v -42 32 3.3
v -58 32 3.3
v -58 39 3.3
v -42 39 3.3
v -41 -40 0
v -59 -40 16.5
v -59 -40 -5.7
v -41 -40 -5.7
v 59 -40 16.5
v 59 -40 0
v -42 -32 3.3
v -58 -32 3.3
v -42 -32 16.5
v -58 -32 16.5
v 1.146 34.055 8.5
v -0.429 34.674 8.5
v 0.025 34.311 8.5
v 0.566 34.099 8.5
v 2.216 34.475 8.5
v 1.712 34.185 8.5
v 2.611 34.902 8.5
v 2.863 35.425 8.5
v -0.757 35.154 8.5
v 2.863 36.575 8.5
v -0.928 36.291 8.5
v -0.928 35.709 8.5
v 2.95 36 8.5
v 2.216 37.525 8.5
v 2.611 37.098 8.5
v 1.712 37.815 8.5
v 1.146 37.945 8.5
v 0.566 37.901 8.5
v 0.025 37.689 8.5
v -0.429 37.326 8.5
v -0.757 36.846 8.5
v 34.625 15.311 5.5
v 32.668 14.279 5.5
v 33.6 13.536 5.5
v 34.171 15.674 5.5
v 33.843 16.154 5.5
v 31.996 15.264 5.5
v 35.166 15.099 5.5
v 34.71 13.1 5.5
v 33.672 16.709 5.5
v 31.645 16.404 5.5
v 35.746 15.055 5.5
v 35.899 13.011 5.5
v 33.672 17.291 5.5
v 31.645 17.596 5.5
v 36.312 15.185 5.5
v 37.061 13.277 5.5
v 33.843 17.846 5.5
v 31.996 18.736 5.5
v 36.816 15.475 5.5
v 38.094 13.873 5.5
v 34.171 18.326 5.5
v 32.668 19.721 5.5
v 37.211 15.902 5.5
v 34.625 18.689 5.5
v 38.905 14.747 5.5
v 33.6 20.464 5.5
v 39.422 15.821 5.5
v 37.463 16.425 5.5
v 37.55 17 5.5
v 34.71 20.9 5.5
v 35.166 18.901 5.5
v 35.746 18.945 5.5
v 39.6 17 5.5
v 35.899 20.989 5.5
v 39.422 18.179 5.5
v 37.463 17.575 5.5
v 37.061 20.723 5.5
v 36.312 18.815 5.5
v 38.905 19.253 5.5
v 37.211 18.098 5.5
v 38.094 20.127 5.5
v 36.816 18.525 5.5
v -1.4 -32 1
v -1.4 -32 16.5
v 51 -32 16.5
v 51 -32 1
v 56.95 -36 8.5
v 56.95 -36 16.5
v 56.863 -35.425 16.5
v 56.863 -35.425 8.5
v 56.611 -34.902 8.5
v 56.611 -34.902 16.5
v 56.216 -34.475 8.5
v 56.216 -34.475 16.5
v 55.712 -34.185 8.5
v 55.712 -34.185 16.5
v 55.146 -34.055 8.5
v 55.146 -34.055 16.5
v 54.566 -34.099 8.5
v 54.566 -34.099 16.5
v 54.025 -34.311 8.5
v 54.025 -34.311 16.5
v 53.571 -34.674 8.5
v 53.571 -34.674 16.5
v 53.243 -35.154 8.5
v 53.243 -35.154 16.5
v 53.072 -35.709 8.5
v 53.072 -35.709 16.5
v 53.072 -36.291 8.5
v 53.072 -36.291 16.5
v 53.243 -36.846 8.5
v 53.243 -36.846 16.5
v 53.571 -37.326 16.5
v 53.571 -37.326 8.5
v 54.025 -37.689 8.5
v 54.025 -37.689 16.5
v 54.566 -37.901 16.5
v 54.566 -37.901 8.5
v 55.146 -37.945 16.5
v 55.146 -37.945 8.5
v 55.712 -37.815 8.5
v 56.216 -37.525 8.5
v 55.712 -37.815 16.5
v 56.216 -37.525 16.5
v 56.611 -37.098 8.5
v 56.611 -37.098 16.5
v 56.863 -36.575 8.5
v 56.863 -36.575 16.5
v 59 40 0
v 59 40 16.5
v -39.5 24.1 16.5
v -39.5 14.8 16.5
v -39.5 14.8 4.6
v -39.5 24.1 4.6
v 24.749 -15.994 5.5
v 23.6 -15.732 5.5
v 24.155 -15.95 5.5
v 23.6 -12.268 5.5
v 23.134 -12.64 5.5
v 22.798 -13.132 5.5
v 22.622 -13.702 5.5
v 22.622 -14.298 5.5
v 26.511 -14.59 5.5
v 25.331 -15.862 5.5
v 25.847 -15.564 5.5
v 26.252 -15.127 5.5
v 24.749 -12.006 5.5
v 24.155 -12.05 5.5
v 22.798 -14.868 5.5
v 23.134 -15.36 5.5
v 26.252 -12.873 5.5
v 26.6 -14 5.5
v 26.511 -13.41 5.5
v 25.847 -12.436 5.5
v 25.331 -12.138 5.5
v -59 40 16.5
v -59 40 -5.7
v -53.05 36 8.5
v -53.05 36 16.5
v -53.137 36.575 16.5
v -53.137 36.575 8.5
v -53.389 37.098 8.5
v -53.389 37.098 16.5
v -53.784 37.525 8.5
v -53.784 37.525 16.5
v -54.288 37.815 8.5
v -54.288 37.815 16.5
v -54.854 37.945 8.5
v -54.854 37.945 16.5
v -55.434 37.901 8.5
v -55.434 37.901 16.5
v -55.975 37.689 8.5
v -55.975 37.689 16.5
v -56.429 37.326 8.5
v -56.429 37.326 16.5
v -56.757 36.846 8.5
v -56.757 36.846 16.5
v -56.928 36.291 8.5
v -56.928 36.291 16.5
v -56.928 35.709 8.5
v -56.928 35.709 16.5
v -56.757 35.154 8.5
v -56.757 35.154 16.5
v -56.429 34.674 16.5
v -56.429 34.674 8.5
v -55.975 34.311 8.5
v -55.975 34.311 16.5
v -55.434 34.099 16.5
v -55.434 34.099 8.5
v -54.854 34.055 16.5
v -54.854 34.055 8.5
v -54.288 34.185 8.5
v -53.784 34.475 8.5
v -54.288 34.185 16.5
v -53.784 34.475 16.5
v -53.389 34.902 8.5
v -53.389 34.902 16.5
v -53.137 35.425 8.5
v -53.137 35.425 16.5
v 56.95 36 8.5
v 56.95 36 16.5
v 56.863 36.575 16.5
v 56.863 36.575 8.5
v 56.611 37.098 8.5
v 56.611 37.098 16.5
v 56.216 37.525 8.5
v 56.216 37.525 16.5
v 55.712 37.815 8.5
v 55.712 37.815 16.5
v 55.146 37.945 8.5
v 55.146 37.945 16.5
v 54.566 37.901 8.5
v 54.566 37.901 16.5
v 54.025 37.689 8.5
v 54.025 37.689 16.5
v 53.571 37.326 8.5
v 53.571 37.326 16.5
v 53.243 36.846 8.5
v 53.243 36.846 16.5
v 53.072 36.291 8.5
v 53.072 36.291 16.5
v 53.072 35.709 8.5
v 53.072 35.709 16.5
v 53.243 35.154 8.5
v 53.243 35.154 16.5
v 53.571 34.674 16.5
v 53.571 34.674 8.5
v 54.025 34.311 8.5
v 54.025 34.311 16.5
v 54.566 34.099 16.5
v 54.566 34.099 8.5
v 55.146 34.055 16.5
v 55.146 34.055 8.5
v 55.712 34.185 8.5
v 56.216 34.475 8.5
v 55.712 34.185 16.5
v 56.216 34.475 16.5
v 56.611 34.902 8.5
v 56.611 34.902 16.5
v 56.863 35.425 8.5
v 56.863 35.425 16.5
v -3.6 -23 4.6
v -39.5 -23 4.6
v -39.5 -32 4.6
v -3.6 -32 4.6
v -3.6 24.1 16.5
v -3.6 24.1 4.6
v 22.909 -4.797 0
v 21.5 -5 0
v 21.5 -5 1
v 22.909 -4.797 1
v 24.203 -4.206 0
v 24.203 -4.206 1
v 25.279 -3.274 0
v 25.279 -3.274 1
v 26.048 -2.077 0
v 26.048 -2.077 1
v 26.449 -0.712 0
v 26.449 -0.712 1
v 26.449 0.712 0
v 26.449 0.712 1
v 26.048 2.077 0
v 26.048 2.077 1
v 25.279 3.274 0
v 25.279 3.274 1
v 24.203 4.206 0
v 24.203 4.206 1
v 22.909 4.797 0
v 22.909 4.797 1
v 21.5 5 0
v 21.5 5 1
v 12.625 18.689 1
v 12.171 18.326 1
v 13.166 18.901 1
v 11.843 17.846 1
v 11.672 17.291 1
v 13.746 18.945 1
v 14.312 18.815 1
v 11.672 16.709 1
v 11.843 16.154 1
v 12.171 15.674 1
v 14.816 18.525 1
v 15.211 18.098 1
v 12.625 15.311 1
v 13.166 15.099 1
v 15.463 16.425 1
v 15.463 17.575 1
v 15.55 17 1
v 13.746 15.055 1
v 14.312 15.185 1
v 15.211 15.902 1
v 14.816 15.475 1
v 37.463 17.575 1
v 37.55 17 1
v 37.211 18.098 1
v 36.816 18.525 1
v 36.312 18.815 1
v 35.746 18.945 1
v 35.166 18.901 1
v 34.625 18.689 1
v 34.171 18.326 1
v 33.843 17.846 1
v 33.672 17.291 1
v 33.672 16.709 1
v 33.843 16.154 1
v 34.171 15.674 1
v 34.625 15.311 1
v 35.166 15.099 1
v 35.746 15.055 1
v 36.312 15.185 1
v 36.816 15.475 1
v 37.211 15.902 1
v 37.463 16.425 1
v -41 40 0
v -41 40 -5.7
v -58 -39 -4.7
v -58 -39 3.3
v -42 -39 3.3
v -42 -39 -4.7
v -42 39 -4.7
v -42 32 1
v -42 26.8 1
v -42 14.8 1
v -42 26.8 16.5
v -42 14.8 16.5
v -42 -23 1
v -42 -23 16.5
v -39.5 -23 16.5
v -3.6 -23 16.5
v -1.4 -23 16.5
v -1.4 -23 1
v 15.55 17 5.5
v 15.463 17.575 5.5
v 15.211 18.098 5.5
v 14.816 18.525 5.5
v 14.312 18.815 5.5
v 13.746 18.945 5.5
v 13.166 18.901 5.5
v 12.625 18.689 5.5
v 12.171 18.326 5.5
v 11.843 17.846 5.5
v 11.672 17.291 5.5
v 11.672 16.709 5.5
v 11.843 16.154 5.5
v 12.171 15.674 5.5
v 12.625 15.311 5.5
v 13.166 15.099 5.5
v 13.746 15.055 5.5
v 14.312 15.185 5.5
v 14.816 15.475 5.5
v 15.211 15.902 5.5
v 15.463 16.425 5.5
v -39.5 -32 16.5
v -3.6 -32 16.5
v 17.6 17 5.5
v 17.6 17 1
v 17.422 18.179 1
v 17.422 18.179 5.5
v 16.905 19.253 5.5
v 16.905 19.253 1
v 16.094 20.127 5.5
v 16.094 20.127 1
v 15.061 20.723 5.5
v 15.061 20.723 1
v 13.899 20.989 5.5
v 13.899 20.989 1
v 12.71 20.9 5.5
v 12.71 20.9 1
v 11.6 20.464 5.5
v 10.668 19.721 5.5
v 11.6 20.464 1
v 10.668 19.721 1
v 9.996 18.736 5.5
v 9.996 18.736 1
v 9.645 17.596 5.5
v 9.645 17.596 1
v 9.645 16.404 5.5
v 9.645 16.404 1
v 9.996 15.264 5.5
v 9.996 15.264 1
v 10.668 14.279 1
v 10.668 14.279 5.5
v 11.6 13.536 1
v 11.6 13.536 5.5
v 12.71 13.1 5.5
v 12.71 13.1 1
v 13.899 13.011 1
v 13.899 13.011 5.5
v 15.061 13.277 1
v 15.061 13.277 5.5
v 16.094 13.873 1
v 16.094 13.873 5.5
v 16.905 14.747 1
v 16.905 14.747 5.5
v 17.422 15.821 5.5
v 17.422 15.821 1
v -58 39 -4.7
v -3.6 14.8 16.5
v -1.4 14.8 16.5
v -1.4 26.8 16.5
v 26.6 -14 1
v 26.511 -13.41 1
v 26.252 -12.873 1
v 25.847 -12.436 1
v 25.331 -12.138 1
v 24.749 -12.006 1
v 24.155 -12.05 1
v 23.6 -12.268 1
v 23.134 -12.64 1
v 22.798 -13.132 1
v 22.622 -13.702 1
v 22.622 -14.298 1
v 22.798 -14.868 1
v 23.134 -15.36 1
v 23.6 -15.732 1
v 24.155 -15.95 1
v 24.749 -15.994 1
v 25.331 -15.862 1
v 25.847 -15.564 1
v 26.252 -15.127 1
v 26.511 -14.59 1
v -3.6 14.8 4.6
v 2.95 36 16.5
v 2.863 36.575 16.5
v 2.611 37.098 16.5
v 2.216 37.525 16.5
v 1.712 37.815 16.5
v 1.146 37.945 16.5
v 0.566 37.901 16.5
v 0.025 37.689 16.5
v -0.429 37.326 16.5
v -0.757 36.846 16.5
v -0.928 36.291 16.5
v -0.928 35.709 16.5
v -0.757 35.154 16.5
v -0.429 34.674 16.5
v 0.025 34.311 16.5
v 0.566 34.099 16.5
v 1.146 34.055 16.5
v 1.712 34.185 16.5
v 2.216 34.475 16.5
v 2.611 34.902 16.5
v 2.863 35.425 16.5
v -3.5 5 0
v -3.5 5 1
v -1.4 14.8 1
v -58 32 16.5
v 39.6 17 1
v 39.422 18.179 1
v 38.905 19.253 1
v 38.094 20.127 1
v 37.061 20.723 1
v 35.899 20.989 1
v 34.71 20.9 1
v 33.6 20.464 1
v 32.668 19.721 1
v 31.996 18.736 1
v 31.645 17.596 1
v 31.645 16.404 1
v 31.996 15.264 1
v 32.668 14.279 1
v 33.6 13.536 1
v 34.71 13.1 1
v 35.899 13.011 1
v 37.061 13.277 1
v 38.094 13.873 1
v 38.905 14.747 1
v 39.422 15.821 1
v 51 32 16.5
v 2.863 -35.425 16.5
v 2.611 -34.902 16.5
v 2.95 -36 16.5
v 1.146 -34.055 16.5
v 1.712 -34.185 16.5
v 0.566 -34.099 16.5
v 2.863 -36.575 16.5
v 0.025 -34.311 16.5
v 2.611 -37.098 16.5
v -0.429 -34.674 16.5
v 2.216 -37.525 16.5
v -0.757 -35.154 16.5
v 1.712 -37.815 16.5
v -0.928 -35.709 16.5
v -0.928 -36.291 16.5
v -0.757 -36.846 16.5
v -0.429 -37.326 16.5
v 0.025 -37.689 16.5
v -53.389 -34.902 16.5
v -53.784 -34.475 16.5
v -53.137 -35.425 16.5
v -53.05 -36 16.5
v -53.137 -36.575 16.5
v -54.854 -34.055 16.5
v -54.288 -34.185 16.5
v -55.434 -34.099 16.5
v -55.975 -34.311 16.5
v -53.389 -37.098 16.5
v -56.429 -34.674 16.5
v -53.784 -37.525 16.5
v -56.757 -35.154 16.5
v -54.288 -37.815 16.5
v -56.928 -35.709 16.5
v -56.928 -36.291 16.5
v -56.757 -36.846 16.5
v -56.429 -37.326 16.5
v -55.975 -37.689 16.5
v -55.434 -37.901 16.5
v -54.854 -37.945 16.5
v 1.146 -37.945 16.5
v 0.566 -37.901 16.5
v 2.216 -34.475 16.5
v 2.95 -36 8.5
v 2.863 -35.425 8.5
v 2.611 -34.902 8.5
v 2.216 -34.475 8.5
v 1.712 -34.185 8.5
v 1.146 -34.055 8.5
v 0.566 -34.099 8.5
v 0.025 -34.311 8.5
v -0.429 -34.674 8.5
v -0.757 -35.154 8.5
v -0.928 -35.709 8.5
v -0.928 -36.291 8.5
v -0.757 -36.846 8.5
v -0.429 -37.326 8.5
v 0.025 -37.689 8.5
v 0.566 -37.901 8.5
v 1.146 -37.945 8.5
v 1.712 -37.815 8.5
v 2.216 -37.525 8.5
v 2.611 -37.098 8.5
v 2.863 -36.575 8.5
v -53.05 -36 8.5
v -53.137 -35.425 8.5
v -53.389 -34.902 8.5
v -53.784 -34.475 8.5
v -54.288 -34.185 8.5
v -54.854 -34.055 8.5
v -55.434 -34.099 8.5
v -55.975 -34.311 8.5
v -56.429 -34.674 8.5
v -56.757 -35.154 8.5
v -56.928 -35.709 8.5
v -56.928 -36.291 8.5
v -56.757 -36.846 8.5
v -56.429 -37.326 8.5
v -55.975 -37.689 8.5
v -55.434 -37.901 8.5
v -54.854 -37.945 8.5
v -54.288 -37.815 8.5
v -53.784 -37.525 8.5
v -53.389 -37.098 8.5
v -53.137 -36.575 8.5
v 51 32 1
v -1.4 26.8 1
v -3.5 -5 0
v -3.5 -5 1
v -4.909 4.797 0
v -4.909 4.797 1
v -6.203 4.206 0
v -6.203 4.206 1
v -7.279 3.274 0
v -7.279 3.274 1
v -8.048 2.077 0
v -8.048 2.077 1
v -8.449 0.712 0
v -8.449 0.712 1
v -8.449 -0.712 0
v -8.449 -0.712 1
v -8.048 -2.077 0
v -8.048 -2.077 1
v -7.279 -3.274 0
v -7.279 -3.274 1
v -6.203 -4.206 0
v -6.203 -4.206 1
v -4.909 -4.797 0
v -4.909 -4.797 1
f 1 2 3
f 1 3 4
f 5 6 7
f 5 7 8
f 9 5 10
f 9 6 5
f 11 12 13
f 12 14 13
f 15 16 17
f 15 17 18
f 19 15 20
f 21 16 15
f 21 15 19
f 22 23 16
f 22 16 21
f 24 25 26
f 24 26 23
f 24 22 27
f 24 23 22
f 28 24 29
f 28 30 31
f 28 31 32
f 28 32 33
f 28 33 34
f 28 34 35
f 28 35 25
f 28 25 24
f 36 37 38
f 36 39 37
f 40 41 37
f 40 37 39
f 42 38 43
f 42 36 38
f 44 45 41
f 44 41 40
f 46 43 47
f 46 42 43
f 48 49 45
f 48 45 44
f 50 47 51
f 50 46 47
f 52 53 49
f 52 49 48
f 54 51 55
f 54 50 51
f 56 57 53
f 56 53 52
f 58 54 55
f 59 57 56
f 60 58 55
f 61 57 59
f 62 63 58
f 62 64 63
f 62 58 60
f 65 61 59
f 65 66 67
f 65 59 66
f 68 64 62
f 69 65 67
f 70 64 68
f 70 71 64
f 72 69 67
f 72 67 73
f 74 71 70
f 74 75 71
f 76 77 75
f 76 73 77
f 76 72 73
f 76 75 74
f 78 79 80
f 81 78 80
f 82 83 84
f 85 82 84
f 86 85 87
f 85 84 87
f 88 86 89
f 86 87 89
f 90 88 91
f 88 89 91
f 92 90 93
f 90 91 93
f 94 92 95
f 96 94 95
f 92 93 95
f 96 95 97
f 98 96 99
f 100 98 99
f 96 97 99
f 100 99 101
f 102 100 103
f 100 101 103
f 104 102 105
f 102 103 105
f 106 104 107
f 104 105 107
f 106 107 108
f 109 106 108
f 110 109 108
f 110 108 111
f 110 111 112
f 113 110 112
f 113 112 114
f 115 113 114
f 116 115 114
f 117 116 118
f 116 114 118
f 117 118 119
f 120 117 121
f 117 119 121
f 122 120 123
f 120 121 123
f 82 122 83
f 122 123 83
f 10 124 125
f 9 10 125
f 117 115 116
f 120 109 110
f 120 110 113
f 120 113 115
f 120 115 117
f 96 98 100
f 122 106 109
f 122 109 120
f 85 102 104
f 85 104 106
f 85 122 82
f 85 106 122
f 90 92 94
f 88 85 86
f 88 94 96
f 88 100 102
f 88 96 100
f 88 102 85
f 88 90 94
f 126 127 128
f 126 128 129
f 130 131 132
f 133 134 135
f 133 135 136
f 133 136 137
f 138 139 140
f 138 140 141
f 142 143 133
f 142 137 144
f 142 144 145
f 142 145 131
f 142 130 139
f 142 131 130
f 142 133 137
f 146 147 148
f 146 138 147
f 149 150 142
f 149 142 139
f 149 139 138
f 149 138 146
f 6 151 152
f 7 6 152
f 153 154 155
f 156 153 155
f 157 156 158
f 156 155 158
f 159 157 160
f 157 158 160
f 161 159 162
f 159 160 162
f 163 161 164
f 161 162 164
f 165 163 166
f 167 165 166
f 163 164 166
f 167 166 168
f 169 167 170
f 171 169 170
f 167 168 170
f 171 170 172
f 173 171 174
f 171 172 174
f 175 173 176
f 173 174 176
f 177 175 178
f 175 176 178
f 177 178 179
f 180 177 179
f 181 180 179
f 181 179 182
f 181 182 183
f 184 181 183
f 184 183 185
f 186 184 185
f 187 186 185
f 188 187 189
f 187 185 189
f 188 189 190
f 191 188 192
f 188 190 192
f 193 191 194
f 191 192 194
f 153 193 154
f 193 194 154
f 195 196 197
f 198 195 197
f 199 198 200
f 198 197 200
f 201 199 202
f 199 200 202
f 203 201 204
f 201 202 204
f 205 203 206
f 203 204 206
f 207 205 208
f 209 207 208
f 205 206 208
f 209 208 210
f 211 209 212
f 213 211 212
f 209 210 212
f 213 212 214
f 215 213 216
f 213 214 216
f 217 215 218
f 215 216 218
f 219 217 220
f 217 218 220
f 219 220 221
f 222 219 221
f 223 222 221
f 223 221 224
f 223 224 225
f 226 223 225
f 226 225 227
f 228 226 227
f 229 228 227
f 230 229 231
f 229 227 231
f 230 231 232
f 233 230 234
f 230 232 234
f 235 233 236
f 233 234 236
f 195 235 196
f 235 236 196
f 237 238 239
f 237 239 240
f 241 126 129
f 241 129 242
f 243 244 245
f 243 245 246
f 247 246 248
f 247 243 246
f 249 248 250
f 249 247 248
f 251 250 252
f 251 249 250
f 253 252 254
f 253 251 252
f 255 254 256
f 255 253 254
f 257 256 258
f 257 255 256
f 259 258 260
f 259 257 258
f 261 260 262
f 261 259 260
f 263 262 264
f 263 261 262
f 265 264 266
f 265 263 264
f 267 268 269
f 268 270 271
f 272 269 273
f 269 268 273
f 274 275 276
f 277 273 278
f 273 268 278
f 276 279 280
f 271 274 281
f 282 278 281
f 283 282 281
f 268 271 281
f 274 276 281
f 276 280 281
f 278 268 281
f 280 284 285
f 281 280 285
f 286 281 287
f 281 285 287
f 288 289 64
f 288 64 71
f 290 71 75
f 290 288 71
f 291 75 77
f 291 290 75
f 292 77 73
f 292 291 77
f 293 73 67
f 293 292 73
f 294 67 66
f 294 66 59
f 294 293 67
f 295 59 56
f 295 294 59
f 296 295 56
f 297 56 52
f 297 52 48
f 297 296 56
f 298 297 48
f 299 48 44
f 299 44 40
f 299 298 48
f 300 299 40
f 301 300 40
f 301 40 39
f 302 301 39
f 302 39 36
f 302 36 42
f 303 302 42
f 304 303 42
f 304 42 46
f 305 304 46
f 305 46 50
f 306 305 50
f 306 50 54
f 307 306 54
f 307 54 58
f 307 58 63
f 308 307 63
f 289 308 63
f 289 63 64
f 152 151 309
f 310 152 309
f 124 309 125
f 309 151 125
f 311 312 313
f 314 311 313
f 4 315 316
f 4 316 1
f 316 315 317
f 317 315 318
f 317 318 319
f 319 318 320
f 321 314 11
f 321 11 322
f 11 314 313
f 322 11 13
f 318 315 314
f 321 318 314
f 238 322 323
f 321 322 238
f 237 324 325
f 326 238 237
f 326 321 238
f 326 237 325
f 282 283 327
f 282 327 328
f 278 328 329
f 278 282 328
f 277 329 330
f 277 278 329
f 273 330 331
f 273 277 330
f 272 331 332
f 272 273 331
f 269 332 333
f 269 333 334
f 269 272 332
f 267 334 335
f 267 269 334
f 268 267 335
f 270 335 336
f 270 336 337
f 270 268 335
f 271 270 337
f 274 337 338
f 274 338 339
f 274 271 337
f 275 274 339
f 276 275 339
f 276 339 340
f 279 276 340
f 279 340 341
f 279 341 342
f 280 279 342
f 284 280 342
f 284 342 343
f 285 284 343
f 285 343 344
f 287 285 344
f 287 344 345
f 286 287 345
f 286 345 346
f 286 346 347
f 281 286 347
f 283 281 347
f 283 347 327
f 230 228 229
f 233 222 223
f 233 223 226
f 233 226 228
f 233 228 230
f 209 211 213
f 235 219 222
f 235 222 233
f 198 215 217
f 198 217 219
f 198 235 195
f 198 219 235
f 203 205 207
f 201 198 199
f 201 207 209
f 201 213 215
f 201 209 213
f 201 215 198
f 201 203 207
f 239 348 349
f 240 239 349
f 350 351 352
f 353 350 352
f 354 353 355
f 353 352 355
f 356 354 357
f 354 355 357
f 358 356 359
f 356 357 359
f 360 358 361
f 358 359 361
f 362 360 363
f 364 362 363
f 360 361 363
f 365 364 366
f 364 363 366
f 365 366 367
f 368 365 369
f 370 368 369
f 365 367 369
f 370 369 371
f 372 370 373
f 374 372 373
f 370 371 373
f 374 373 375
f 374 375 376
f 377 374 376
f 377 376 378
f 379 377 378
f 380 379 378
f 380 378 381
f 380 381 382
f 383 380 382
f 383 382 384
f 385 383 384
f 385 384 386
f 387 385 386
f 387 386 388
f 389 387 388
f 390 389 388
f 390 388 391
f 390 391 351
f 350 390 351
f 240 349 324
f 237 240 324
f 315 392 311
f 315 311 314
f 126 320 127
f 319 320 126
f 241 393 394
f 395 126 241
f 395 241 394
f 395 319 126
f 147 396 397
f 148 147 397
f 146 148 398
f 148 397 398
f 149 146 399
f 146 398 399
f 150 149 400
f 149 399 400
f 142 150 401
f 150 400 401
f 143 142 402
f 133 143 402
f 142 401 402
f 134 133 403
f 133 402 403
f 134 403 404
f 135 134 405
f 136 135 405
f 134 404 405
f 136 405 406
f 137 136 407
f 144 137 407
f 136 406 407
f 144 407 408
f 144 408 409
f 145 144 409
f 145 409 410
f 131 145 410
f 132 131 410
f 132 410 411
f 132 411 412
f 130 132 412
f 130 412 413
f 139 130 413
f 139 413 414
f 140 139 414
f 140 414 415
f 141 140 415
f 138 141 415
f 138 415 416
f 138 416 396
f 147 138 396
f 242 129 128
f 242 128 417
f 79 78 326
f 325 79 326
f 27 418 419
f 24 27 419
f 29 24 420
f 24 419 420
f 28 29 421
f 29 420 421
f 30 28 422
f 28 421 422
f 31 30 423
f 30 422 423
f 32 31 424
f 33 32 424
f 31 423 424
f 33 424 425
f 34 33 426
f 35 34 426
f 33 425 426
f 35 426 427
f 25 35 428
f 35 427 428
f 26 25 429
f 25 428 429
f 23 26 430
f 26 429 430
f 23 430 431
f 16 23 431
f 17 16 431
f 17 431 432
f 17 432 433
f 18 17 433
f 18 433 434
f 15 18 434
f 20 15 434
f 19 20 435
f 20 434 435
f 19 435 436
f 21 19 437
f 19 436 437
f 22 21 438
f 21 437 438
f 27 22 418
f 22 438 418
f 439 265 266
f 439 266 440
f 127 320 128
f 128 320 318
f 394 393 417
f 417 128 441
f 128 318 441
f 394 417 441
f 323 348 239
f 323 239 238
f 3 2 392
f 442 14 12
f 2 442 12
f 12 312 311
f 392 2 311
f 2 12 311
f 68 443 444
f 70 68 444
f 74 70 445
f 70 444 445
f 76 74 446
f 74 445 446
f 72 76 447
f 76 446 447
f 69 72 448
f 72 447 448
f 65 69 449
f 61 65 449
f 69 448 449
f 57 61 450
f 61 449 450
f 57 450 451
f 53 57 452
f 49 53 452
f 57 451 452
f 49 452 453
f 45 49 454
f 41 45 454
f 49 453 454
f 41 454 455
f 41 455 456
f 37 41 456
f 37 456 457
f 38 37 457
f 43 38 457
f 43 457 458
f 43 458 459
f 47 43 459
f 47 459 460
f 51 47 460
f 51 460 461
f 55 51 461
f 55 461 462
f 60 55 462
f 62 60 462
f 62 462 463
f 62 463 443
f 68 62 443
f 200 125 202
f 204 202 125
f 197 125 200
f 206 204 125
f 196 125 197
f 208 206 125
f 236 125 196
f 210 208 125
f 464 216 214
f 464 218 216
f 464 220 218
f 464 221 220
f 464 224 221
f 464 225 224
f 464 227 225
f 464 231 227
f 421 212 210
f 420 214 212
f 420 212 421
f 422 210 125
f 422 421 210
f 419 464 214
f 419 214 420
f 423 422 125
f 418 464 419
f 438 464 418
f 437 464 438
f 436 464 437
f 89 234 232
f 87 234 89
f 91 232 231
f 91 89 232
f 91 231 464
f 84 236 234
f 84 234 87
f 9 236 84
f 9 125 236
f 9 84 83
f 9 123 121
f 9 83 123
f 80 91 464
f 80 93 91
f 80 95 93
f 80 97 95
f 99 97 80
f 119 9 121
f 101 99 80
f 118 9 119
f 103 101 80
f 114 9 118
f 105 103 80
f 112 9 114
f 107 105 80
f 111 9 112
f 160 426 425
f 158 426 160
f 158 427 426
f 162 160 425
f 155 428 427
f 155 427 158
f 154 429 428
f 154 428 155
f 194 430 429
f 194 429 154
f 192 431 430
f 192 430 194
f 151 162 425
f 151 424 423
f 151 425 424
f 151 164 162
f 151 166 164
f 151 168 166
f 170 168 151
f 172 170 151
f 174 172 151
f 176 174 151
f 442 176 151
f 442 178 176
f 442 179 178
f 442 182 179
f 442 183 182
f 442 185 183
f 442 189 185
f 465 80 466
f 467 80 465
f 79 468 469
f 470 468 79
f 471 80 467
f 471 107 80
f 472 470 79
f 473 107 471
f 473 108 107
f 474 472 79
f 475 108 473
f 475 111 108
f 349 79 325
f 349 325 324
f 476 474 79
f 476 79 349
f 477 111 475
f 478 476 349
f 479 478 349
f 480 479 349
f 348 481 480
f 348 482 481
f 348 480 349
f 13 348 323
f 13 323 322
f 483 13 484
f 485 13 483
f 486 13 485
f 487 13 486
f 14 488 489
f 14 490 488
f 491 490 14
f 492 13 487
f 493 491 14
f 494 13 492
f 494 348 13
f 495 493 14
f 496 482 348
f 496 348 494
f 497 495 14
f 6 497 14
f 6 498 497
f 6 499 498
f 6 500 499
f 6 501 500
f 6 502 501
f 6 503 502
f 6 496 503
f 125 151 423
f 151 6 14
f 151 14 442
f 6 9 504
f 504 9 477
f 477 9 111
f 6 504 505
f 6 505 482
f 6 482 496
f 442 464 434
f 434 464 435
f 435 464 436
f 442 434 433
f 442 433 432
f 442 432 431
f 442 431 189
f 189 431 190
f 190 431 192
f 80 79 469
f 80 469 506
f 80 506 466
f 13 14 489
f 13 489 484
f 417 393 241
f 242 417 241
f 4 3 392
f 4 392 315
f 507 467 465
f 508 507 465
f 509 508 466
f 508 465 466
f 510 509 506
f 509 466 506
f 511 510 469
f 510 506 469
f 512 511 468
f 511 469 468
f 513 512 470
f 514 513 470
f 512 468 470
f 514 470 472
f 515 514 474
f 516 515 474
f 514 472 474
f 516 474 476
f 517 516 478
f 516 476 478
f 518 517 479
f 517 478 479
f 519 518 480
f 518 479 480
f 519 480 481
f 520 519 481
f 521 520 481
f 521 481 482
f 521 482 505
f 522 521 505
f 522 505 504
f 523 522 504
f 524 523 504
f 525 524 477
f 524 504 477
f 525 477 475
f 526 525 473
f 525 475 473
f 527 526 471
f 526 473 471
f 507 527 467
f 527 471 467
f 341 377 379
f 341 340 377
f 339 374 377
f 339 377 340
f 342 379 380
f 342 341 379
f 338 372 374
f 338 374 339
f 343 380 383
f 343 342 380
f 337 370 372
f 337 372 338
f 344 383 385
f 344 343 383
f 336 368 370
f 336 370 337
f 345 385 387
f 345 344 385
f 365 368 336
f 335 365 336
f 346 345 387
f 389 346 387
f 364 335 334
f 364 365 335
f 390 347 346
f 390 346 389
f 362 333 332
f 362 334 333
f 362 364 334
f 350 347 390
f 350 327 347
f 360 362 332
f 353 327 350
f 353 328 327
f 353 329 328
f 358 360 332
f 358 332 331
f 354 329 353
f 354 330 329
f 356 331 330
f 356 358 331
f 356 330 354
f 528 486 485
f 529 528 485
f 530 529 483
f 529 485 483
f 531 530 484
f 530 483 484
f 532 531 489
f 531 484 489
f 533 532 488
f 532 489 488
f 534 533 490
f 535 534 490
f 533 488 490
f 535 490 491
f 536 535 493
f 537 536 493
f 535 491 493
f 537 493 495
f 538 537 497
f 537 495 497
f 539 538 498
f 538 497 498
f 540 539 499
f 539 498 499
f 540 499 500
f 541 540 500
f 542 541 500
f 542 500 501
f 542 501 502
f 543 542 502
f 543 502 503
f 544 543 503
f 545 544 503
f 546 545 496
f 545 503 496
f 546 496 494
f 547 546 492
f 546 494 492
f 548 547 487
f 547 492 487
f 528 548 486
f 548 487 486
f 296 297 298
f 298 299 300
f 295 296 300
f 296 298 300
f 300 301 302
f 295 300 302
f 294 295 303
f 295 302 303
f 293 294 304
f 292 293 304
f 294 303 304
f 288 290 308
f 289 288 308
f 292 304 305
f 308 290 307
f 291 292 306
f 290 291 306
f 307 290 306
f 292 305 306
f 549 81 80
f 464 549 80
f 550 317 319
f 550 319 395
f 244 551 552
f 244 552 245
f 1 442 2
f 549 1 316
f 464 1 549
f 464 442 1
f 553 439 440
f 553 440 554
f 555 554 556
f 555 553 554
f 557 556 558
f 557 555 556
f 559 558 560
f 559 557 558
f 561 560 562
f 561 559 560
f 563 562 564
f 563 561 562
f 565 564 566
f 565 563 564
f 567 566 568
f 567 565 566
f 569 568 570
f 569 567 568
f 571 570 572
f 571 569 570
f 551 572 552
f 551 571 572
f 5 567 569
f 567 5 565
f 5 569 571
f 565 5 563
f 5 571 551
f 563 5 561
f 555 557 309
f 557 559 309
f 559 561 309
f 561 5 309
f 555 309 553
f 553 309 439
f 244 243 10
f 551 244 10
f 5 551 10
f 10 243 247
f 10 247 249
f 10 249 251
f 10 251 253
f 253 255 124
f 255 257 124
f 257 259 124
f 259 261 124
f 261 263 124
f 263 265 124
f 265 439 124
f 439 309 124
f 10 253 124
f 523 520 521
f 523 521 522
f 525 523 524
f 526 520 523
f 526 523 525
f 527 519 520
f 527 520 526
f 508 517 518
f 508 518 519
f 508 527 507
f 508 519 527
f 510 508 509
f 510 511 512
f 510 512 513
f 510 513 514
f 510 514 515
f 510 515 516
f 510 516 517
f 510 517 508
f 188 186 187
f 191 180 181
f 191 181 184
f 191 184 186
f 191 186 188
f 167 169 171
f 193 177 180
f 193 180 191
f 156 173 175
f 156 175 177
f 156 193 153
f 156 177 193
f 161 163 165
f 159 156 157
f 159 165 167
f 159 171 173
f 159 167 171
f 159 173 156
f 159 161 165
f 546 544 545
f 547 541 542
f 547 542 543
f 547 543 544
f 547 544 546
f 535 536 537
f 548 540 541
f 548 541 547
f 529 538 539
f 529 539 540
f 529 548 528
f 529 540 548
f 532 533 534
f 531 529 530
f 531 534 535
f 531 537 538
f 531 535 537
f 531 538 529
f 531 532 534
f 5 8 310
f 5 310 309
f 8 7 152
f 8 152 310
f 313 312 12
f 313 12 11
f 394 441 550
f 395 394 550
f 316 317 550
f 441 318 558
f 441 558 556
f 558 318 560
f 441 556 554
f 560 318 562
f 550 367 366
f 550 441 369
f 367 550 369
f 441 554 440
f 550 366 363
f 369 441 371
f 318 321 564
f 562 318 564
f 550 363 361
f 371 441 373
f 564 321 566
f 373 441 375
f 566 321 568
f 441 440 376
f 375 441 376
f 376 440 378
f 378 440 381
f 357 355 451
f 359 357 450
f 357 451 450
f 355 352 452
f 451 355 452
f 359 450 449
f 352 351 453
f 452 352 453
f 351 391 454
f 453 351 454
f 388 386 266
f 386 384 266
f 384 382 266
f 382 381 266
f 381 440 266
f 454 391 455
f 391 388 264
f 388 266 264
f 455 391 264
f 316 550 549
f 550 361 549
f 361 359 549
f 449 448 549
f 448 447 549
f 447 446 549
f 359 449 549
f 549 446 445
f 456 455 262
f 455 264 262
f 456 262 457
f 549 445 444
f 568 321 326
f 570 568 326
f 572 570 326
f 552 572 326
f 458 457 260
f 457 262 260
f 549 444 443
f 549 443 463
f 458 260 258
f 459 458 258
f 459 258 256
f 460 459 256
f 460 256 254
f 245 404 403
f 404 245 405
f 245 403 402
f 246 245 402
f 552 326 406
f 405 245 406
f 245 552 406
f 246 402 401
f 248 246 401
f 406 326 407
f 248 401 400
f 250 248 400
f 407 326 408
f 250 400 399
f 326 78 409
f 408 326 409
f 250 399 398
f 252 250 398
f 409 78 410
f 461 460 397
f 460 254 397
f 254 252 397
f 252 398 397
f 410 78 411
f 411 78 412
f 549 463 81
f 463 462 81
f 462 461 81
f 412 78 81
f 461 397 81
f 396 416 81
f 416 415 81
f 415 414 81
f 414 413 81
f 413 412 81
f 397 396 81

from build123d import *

# Parameters (mm, degrees)
PAD_DEPTH       = 40
POCKET_DEPTH    = 32
POCKET001_DEPTH = 1
SKETCH007_R     = 4
SKETCH007_R_2   = 1.95
SKETCH007_R_3   = 2
PAD005_DEPTH    = 5.5
SKETCH008_W     = 16
SKETCH008_H     = 8
POCKET002_DEPTH = 39
SKETCH013_R     = 1.95
POCKET003_DEPTH = 8
SKETCH018_W     = 40.6
SKETCH018_H     = 12
SKETCH018_H_2   = 9
PAD012_DEPTH    = 16.5
SKETCH019_W     = 35.9
SKETCH019_H     = 56.1
POCKET006_DEPTH = 11.9


with BuildPart() as part:
    # Sketch → Pad (new body, symmetric)
    with BuildSketch(Plane.XZ):
        Polygon((-59, 16.5), (-59, -5.7), (-41, -5.7), (-41, 0), (59, 0), (59, 16.5), align=None)
    extrude(amount=PAD_DEPTH, both=True)

    # Sketch001 → Pocket (cut, symmetric)
    with BuildSketch(Plane.XZ):
        Polygon((-42, 1), (51, 1), (51, 17.5), (-58, 17.5), (-58, -4.7), (-42, -4.7), align=None)
    extrude(amount=POCKET_DEPTH, both=True, mode=Mode.SUBTRACT)

    # Sketch004 → Pocket001 (cut)
    with BuildSketch(Plane.XY):
        with BuildLine():
            ThreePointArc((-3.5, 5), (-8.5, 0), (-3.5, -5))
            Line((-3.5, -5), (21.5, -5))
            ThreePointArc((21.5, -5), (26.5, 0), (21.5, 5))
            Line((21.5, 5), (-3.5, 5))
        make_face()
    extrude(amount=POCKET001_DEPTH, mode=Mode.SUBTRACT)

    # Sketch007 → Pad005 (join)
    with BuildSketch(Plane.XY):
        with Locations((13.6, 17)):
            Circle(SKETCH007_R)
        with Locations((13.6, 17)):
            Circle(SKETCH007_R_2, mode=Mode.SUBTRACT)
        with Locations((35.6, 17)):
            Circle(SKETCH007_R)
        with Locations((35.6, 17)):
            Circle(SKETCH007_R_2, mode=Mode.SUBTRACT)
        with Locations((24.6, -14)):
            Circle(SKETCH007_R_3)
    extrude(amount=PAD005_DEPTH)

    # Sketch008 → Pocket002 (cut, symmetric)
    with BuildSketch(Plane.XZ):
        with Locations((-50, -0.7)):
            Rectangle(SKETCH008_W, SKETCH008_H)
    extrude(amount=POCKET002_DEPTH, both=True, mode=Mode.SUBTRACT)

    # Sketch013 (on DatumPlane) → Pocket003 (cut)
    with BuildSketch(Plane.XY.offset(16.5)):
        with Locations((-55, 36)):
            Circle(SKETCH013_R)
        with Locations((1, 36)):
            Circle(SKETCH013_R)
        with Locations((55, 36)):
            Circle(SKETCH013_R)
        with Locations((55, -36)):
            Circle(SKETCH013_R)
        with Locations((1, -36)):
            Circle(SKETCH013_R)
        with Locations((-55, -36)):
            Circle(SKETCH013_R)
    extrude(amount=-POCKET003_DEPTH, mode=Mode.SUBTRACT)

    # Sketch018 → Pad012 (join)
    with BuildSketch(Plane.XY):
        with Locations((-21.7, 20.8)):
            Rectangle(SKETCH018_W, SKETCH018_H)
        with Locations((-21.7, -27.5)):
            Rectangle(SKETCH018_W, SKETCH018_H_2)
    extrude(amount=PAD012_DEPTH)

    # Sketch019 (on DatumPlane) → Pocket006 (cut)
    with BuildSketch(Plane.XY.offset(16.5)):
        with Locations((-21.55, -3.95)):
            Rectangle(SKETCH019_W, SKETCH019_H)
    extrude(amount=-POCKET006_DEPTH, mode=Mode.SUBTRACT)


solid = part.part
